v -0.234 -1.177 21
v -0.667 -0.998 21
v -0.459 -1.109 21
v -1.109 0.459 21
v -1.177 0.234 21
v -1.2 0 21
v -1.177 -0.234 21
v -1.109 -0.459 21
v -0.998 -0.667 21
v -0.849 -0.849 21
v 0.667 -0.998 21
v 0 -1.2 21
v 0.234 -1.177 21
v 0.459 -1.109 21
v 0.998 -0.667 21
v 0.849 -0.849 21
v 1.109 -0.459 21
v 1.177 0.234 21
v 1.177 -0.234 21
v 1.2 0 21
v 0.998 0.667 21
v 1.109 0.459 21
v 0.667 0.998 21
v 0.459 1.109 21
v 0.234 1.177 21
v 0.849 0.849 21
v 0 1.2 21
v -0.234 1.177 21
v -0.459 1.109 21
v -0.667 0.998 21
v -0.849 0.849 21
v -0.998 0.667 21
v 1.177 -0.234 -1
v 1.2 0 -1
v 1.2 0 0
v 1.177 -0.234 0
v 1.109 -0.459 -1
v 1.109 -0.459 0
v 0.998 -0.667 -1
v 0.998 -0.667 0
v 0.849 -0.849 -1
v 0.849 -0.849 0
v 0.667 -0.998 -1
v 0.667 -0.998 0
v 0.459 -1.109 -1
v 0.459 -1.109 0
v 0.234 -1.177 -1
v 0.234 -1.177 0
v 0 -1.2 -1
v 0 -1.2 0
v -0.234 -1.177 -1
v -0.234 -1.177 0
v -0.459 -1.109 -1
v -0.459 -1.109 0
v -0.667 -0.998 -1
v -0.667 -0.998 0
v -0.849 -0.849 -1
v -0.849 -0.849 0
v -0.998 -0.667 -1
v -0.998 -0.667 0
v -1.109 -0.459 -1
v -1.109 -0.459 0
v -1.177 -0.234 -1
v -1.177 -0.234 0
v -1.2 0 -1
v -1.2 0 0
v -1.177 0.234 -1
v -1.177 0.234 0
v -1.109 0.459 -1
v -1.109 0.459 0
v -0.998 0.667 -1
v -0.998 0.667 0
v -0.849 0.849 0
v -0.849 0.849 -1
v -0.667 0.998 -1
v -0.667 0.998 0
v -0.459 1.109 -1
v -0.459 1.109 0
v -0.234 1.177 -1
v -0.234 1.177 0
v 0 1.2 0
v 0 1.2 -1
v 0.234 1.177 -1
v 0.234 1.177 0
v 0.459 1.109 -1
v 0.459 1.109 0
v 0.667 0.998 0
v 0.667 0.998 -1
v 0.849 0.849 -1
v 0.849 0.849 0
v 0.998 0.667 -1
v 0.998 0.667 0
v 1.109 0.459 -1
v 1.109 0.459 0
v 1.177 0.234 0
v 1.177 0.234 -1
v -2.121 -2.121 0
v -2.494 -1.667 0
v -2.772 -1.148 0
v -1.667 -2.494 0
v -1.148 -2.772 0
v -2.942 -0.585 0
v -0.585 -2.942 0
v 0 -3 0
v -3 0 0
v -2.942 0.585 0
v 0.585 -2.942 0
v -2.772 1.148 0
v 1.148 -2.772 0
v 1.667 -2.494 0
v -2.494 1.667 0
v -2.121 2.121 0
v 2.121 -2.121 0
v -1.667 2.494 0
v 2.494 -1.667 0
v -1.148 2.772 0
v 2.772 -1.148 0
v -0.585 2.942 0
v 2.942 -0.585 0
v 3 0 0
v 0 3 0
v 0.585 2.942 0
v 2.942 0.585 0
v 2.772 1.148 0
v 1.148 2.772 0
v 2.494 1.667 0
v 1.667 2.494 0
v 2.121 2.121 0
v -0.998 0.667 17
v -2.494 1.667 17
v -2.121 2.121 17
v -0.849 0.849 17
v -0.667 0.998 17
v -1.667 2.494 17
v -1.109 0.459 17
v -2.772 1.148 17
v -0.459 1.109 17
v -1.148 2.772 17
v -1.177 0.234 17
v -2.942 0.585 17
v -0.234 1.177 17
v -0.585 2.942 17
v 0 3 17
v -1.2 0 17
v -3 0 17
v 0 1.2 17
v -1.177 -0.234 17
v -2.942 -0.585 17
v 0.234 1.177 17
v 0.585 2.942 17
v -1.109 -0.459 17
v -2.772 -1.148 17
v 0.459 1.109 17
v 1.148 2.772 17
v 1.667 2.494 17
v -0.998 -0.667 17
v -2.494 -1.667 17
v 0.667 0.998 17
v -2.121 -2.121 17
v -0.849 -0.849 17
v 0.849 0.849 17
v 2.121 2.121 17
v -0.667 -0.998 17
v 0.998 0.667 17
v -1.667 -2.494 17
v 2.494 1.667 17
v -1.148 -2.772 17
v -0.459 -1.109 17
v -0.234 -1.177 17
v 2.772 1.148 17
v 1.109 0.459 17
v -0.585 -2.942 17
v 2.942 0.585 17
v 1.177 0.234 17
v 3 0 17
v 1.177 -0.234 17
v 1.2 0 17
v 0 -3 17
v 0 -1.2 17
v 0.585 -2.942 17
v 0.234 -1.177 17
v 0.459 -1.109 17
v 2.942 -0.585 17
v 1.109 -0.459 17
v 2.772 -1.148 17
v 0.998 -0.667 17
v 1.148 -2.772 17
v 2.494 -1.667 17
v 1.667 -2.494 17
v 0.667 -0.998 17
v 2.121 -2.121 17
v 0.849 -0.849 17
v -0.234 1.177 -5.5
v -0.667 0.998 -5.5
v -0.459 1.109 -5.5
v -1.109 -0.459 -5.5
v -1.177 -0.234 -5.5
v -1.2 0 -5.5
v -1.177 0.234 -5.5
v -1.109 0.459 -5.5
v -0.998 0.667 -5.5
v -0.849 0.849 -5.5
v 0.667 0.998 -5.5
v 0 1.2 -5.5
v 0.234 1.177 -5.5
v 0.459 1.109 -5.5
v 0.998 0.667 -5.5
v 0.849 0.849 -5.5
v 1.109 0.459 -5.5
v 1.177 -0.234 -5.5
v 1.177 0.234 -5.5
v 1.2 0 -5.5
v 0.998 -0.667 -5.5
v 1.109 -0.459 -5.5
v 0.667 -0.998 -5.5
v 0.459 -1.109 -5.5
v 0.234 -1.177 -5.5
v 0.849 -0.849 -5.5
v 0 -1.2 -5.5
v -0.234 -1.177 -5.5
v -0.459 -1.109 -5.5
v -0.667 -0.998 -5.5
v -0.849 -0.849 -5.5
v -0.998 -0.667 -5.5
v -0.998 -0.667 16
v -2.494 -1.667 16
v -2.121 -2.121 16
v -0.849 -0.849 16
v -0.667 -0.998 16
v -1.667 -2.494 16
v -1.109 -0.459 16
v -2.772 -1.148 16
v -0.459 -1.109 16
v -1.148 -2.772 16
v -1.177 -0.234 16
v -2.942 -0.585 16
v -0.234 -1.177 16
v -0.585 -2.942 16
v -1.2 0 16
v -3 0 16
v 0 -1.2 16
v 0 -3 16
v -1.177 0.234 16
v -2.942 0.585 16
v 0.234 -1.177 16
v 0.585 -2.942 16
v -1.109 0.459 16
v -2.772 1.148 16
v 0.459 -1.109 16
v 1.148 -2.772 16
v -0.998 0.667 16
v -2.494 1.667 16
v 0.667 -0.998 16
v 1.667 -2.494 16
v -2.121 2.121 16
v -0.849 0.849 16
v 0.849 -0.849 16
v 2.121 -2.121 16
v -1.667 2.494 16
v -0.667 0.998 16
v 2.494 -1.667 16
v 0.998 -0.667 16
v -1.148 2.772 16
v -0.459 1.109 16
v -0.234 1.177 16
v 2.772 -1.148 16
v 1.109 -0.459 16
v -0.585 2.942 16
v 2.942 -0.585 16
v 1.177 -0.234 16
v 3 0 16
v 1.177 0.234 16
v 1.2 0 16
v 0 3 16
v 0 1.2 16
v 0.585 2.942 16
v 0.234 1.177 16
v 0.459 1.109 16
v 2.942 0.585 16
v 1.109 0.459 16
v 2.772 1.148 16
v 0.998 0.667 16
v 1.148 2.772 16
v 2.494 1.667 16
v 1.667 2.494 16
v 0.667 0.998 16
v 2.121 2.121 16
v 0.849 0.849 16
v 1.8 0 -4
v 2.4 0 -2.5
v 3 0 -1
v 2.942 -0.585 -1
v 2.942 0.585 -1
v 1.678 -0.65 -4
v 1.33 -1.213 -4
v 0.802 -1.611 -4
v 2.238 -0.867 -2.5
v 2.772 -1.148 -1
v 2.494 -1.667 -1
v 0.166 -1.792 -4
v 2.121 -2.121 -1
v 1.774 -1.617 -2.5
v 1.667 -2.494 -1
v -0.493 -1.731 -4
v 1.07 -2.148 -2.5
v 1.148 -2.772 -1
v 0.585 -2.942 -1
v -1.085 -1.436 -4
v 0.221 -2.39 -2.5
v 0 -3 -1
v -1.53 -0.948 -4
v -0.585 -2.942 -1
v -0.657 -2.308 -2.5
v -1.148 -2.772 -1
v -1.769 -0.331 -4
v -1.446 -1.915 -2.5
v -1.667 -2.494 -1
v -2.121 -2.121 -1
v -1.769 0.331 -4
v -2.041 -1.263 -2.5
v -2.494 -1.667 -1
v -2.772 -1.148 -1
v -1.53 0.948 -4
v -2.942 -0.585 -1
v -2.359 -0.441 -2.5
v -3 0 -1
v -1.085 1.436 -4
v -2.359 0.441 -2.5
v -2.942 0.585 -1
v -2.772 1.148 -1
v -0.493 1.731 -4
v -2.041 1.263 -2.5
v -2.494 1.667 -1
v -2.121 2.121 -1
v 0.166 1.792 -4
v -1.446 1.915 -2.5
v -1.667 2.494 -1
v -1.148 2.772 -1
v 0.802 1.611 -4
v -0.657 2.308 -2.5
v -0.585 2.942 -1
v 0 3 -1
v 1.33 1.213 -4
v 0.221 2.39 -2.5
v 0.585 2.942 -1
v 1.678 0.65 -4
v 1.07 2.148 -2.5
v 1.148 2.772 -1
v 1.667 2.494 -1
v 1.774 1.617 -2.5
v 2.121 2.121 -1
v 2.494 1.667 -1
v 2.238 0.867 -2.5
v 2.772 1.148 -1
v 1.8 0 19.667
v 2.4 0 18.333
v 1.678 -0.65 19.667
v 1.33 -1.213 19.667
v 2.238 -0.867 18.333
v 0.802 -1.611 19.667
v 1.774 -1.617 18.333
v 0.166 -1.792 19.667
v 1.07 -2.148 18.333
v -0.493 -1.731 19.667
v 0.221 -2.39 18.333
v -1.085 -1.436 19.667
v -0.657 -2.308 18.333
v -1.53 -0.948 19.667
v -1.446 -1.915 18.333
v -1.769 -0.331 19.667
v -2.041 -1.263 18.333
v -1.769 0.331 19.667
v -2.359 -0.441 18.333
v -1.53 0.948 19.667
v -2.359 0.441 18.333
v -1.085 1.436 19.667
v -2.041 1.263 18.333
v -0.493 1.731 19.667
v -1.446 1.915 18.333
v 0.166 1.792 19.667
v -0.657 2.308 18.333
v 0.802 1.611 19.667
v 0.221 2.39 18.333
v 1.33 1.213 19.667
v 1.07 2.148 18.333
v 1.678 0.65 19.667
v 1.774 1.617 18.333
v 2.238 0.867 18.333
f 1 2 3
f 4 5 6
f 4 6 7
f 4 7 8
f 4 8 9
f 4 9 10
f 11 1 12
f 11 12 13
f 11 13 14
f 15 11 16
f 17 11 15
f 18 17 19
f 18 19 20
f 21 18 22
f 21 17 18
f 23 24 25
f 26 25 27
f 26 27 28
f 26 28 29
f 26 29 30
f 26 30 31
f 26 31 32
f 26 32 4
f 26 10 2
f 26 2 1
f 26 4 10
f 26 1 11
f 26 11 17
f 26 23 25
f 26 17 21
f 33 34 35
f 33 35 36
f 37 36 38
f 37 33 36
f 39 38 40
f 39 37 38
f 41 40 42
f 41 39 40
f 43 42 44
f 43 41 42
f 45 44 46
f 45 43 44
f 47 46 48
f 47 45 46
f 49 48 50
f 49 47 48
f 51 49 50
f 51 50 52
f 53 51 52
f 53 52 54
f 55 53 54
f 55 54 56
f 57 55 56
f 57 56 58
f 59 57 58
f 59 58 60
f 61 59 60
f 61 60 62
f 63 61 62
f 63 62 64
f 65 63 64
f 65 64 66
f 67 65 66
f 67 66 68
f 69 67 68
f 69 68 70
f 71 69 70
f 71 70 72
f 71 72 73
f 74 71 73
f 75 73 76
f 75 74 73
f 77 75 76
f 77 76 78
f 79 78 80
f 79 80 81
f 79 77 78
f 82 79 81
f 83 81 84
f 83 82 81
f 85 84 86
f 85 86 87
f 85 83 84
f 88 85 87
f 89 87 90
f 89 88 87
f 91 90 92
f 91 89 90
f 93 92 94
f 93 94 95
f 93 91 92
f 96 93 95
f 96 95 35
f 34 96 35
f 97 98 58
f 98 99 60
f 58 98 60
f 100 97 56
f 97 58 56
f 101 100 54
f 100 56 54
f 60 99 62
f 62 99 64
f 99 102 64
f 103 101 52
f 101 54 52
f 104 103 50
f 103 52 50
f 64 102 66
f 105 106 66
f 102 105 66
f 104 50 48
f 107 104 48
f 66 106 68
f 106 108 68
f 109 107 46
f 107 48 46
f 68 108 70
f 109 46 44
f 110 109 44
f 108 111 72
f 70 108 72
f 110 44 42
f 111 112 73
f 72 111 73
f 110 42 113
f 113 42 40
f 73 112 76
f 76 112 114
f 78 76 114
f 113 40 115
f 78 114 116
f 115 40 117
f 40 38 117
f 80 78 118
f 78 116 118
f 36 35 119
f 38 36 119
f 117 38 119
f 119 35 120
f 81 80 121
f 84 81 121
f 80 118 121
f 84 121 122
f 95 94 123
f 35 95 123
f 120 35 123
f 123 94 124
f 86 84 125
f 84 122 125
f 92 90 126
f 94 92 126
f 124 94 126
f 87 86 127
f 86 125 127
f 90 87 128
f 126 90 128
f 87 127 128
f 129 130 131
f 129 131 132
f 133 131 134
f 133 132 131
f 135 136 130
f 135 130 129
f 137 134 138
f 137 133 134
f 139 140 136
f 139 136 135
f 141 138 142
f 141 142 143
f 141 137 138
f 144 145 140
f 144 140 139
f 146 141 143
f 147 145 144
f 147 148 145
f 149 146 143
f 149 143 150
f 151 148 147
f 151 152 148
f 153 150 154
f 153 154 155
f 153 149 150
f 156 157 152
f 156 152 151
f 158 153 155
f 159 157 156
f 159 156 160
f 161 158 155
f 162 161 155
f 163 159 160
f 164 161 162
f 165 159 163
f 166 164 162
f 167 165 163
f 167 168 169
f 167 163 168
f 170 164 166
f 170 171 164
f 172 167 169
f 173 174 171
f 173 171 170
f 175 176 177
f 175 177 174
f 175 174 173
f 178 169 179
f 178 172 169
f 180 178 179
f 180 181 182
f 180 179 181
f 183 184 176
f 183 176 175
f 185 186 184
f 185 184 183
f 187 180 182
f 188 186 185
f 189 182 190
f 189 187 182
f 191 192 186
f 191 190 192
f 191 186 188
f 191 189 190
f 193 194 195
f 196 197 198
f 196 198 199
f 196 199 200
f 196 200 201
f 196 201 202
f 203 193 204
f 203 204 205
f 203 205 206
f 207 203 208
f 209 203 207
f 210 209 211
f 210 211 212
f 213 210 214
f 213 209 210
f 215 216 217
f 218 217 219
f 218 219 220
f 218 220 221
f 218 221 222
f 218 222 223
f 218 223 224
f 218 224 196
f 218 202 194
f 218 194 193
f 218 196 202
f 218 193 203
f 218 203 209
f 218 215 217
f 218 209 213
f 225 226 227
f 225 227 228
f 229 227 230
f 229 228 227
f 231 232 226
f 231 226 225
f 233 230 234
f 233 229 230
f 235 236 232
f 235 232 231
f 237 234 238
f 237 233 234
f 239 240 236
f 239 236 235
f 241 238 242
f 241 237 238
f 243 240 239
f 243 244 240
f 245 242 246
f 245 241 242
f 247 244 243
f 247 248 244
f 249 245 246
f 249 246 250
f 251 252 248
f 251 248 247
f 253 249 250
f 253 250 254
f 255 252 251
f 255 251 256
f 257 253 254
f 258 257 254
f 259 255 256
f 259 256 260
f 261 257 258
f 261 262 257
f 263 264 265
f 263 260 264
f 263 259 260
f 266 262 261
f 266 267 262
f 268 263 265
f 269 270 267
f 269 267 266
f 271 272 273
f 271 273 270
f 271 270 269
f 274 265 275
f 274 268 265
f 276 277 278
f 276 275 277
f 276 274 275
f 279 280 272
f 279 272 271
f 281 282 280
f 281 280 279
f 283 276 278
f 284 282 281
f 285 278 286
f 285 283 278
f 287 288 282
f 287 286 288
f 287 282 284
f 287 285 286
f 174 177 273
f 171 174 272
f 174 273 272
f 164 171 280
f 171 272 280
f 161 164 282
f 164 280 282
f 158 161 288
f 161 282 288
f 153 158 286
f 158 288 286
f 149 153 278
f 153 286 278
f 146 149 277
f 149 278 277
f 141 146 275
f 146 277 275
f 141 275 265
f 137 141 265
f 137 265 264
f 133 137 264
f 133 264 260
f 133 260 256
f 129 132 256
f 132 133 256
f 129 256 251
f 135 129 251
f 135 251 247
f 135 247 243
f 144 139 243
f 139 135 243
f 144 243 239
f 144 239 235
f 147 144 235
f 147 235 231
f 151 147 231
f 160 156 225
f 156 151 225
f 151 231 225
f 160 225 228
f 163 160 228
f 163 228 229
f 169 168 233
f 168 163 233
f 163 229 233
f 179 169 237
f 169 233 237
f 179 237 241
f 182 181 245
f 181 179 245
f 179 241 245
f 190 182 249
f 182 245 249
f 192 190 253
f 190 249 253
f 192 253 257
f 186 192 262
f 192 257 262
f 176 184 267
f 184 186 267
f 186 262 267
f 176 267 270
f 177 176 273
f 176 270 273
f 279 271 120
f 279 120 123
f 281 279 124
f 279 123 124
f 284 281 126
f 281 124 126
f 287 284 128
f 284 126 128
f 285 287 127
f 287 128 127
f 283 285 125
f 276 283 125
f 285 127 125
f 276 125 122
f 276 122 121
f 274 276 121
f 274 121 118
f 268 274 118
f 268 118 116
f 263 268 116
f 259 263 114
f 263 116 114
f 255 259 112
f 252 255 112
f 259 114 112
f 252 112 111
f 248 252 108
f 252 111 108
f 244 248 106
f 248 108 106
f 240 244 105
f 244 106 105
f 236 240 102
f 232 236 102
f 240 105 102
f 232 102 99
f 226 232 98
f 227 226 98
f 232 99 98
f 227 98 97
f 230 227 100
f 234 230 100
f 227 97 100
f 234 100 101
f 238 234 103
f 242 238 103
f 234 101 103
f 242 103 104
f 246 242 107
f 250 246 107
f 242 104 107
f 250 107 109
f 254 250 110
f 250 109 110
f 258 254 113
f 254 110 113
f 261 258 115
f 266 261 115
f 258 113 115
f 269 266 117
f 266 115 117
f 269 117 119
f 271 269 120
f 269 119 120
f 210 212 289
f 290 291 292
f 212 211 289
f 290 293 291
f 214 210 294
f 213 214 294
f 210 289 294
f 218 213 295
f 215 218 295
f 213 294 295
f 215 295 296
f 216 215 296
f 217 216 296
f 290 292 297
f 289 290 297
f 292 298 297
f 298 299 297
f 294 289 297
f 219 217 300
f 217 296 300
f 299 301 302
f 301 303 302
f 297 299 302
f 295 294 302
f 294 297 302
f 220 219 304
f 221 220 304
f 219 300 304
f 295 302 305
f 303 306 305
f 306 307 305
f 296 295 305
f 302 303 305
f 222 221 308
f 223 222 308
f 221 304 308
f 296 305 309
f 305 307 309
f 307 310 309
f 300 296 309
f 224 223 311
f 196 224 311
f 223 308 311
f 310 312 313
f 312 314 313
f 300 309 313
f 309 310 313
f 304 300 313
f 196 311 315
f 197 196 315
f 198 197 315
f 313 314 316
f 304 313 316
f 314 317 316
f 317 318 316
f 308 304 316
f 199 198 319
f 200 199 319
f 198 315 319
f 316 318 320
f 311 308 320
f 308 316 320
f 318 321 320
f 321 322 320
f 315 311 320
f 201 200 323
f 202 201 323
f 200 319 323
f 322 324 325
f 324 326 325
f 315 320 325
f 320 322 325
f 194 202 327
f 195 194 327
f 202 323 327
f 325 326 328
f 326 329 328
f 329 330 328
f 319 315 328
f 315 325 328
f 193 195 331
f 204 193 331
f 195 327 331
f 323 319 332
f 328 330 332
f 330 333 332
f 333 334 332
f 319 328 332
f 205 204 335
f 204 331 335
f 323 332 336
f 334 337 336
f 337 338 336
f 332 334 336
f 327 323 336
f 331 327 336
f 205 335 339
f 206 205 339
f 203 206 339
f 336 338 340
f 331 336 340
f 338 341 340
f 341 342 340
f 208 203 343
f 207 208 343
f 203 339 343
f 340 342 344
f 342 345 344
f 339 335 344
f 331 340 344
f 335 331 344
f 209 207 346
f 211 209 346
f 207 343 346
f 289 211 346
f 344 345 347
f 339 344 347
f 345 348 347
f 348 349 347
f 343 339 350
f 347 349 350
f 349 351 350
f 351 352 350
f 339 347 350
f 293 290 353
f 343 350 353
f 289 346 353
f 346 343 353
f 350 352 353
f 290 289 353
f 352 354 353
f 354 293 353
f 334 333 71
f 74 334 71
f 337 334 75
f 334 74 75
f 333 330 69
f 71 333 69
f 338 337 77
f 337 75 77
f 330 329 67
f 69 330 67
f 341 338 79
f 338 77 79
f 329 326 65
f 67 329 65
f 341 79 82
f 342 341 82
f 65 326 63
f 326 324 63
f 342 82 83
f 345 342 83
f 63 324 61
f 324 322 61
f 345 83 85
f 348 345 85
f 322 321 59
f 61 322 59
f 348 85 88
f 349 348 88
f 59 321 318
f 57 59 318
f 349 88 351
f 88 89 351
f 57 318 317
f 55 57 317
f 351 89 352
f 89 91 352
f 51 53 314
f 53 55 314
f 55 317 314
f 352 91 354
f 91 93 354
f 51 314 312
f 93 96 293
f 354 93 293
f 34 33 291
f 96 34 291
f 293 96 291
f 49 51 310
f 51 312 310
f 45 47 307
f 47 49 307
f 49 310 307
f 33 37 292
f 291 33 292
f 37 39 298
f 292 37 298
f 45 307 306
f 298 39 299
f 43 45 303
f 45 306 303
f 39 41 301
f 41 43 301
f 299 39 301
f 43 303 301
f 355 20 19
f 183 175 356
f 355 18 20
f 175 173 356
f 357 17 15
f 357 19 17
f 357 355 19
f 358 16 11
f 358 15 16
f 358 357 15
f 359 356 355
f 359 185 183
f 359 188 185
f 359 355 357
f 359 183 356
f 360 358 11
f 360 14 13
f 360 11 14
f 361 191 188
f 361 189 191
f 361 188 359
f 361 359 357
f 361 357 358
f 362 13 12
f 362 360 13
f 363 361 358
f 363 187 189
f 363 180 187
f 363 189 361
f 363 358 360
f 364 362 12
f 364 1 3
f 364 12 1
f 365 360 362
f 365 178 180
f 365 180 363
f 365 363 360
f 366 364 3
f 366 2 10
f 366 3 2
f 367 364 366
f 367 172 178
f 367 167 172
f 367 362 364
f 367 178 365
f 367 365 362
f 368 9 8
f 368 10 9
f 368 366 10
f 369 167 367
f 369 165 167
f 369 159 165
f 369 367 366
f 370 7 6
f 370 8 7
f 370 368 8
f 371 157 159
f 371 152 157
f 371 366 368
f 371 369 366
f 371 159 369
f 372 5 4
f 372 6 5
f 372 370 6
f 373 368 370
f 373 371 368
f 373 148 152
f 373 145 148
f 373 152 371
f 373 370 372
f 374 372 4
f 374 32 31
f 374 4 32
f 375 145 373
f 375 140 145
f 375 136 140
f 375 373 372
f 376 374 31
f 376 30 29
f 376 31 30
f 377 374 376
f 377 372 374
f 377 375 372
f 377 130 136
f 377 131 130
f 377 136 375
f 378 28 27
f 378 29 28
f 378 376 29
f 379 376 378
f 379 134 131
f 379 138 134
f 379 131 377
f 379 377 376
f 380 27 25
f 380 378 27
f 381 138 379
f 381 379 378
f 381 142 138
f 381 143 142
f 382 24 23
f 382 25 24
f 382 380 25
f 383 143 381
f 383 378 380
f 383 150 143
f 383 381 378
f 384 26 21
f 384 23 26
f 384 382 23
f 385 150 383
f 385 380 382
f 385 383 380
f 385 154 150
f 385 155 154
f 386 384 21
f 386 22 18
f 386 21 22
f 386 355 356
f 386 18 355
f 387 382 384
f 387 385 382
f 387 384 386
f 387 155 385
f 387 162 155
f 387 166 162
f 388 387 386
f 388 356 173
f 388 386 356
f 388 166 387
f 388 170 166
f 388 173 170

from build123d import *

# Parameters (mm, degrees)
ESQUISSE1_R      = 3
EXTRUSION1_DEPTH = 16
ESQUISSE2_R      = 1.2
EXTRUSION2_DEPTH = 5
EXTRUSION3_START = 5.5
ESQUISSE3_R      = 1.2
EXTRUSION3_DEPTH = 5.5


with BuildPart() as part:
    # Esquisse1 → Extrusion1 (new body)
    with BuildSketch(Plane.XY):
        Circle(ESQUISSE1_R)
    extrude(amount=EXTRUSION1_DEPTH)

    # Esquisse2 → Extrusion2 (add)
    with BuildSketch(Plane.XY.offset(16)):
        Circle(ESQUISSE2_R)
    extrude(amount=EXTRUSION2_DEPTH)

    # Esquisse3 → Extrusion3 (add)
    with BuildSketch(Plane(origin=(0, 0, 0), x_dir=(-1, 0, 0), z_dir=(0, 0, -1)).offset(EXTRUSION3_START)):
        with Locations(Location((0, 0, 0), (0, 0, 180))):
            Circle(ESQUISSE3_R)
    extrude(amount=-EXTRUSION3_DEPTH)

    # Esquisse4 → Révolution1 (revolve)
    with BuildSketch(Plane(origin=(0, 0, 0), x_dir=(1, 0, 0), z_dir=(0, 1, 0))):
        Polygon((1.2, 5.5), (3, 1), (0, 1), (0, 5.5), align=None)
        Polygon((0, -21), (1.2, -21), (3, -17), (0, -17), align=None)
    revolve(axis=Axis((0, 0, 16), (0, 0, -1)))


solid = part.part
